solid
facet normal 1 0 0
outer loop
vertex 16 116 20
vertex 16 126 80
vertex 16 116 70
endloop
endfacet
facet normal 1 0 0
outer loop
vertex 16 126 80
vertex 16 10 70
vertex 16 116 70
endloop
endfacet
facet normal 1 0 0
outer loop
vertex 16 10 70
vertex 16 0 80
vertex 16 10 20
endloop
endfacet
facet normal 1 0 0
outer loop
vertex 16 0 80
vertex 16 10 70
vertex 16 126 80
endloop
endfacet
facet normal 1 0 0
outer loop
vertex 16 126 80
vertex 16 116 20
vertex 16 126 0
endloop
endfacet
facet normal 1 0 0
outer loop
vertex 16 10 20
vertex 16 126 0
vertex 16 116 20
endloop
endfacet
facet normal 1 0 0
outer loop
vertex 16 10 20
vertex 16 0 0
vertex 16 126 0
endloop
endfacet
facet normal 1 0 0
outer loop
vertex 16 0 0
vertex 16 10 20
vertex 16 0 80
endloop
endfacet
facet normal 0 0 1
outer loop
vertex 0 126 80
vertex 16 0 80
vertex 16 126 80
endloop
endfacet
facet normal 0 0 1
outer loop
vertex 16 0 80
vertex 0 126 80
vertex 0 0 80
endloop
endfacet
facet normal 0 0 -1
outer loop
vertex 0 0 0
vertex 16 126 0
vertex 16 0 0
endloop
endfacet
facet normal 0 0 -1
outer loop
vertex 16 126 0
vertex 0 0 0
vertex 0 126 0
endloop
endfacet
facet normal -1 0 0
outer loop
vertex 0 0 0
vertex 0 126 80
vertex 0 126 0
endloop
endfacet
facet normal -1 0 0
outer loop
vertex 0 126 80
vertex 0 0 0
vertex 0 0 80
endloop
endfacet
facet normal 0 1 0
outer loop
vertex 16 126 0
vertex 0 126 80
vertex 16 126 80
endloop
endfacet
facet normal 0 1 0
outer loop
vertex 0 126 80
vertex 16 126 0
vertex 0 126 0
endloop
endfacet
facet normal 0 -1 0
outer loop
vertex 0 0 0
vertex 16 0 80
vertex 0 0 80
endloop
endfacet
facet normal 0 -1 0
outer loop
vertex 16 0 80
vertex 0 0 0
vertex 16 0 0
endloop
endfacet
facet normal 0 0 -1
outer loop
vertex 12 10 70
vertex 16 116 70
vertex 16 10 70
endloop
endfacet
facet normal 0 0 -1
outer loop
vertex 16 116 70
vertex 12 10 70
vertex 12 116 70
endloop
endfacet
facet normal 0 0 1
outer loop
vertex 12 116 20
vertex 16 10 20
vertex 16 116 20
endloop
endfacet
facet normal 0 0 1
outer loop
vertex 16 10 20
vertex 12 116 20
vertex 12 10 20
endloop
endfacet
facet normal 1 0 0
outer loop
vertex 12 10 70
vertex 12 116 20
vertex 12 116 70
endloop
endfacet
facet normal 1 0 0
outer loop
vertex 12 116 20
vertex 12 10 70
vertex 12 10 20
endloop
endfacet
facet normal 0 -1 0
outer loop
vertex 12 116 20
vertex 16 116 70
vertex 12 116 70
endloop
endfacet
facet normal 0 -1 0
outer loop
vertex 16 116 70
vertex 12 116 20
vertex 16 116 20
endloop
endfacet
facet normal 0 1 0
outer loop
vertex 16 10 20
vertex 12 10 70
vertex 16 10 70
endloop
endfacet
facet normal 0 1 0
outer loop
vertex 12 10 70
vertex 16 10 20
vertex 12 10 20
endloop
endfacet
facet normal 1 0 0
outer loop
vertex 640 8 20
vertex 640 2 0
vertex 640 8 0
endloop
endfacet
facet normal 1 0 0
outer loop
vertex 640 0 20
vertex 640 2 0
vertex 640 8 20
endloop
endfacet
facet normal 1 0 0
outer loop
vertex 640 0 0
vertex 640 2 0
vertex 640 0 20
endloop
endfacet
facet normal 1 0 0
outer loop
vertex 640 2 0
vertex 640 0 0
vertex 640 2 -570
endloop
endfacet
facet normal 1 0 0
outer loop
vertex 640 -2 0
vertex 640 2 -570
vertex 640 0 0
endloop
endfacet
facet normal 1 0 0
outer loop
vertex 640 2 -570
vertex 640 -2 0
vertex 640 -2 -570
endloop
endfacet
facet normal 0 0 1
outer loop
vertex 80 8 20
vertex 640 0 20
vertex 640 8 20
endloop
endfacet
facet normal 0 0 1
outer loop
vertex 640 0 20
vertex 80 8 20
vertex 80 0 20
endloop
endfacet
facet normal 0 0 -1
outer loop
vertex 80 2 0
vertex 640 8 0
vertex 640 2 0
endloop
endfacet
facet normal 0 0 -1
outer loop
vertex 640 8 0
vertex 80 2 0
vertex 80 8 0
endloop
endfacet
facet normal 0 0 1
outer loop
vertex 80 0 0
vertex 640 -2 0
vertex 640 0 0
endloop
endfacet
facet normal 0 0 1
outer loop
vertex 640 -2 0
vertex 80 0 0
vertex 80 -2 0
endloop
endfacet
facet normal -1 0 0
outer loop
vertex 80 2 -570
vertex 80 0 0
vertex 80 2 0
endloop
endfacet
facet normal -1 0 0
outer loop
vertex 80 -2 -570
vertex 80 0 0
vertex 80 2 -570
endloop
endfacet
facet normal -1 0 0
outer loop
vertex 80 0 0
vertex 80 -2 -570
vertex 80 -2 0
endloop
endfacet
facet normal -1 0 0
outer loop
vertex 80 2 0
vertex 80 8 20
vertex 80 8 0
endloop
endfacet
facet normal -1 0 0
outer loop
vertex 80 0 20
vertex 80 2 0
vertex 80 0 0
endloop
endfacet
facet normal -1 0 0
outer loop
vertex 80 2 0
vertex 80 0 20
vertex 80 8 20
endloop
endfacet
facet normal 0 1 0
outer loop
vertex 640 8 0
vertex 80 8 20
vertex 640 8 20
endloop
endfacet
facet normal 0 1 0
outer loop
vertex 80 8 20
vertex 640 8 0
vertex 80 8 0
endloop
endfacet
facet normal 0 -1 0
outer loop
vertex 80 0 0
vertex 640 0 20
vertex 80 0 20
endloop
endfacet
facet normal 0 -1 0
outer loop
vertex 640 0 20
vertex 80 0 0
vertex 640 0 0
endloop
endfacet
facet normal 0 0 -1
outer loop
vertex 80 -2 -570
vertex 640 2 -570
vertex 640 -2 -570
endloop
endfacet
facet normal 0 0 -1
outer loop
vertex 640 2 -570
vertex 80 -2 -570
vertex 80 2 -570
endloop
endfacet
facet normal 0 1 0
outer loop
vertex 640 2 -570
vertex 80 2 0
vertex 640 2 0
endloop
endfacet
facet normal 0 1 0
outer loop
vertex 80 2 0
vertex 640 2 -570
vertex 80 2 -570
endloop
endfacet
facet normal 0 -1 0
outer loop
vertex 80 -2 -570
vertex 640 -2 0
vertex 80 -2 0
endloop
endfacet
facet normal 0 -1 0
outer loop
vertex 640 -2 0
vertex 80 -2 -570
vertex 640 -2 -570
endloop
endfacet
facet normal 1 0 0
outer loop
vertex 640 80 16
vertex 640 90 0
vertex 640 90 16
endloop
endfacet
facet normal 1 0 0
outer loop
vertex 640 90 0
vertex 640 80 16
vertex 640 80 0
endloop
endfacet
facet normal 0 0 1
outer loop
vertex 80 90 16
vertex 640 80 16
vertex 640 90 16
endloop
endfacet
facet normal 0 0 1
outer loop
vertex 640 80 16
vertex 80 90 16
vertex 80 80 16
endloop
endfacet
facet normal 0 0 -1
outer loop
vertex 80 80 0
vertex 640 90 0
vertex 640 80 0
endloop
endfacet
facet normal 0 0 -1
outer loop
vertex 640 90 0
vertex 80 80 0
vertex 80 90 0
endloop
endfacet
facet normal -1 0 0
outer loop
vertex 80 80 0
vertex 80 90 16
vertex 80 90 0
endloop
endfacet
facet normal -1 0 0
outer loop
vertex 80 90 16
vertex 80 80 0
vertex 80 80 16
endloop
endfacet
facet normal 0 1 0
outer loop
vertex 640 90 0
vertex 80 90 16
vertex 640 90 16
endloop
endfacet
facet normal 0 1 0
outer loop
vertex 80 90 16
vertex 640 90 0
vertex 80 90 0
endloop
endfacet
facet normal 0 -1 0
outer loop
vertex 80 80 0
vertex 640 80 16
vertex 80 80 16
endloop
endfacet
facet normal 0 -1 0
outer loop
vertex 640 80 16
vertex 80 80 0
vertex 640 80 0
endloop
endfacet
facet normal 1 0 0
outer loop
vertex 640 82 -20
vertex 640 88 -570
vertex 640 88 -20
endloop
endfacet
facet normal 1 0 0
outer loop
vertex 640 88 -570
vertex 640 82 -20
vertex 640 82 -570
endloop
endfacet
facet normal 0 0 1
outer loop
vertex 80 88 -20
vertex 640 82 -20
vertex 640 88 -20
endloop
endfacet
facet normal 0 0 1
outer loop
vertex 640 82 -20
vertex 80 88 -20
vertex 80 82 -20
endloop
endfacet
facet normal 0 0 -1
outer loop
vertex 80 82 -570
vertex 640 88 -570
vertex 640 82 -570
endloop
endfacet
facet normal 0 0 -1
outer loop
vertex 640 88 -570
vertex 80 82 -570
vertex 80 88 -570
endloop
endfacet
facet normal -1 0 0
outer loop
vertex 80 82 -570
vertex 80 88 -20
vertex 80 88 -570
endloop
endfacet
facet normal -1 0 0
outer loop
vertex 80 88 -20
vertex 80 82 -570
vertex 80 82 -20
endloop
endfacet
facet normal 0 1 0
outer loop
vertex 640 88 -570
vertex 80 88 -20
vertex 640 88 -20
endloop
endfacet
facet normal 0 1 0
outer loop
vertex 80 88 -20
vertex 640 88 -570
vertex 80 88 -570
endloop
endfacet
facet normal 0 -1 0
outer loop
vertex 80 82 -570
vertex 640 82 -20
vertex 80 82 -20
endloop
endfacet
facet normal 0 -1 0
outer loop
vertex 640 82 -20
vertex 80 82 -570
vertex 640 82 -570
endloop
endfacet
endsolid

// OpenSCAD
// file: ../params.scad
// Shared millimetre parameters. Keep in lockstep with freecad/params.py.
// Module scale: 150 kg/day wet train. Walls are CPVC sheet, not metal.

$fn = 36;

WALL        = 12;     // CPVC sheet thickness
FLOOR       = 16;     // floor plate (trough sits on this)

// LEACH CSTR 1 — inside liquor box
CSTR_L      = 2000;
CSTR_W      = 1200;
CSTR_H      = 1400;   // liquid + freeboard
FREEBOARD   = 200;

// CSTR 2 weir (same vessel, +X wall)
WEIR_W      = 450;
WEIR_CREST  = CSTR_H - FREEBOARD;   // from inner floor
WEIR_SLOT_H = 80;
WEIR_LIP    = 120;    // external spout projection

// CSTR 3 floor auger — injection-molded PVC / FG
AUGER_D     = 140;    // flight OD
AUGER_SHAFT = 40;
AUGER_PITCH = 110;
AUGER_TROUGH_W = 180;
AUGER_TROUGH_H = 110;
AUGER_OFFSET_Y = 280; // trough centreline from inner -Y wall
AUGER_INCLINE  = 28;  // deg, lifts out of liquor toward +X

// mixer / nozzles (lid)
MIXER_D     = 50;
GAS_D       = 80;     // acid-gas takeoff
DROP_X      = 80;     // inner-X of shred drop slot
DROP_L      = 400;
DROP_W      = 250;
DROP_COAM   = 80;     // raised coaming around the slot

// LEACHATE PUMP / coarse strainer — −X wall, opposite the weir
PUMP_D      = 80;     // DN80
PUMP_Z      = 450;    // centreline above inner floor (submerged)
PUMP_Y      = 900;    // centreline from inner −Y (away from auger)
STRAINER_L  = 180;
STRAINER_W  = 140;
STRAINER_H  = 160;

// mezzanine feed train
MEZZ_H      = 2200;   // platform top above tank outer floor
MEZZ_L      = 1600;   // platform length in −X
MEZZ_THK    = 12;
HOPPER_L    = 700;
HOPPER_W    = 600;
HOPPER_H    = 800;
SHRED_L     = 500;
SHRED_W     = 500;
SHRED_H     = 450;
CONV_W      = 240;
CONV_H      = 120;
CONV_PLATE  = 6;      // trough plate
CONV_FLANGE = 40;
CONV_SPRING_D = 50;
CONV_SPRING_H = 80;
CONV_BOLT   = 10;     // M10 clearance
CONV_LEN    = 1800;   // default standalone length; plant instance is computed
DUST_D      = 150;    // dust-hood outlet to DUST header
AUGER_LIFT_L = 700;

// dewater belts + split (Phase A 4–6)
FDEW_L      = 1800;
FDEW_W      = 450;
FDEW_H      = 80;
FDEW_RISE   = 120;    // solids end higher so liquor runs back to weir
SDEW_L      = 1400;
SDEW_W      = 220;
SDEW_H      = 80;
SPLIT_L     = 600;
SPLIT_W     = 500;
SPLIT_H     = 400;
STUB_L      = 400;
STUB_W      = 300;
STUB_H      = 250;

// EW funnel cell
EW_L        = 600;    // along aisle (overflow direction)
EW_W        = 420;    // anode-cathode depth
EW_H        = 650;    // rectangular body
EW_FUNNEL_H = 220;
EW_VALVE_D  = 50;
EW_VALVE_L  = 60;
EW_MEM_T    = 4;      // CEM
EW_SLOT     = 10;     // membrane cassette slot
EW_PITCH    = 750;    // aisle spacing, centre to centre
AISLE_X0    = 200;
AISLE_Y     = -(EW_W + 2*WALL) - 400;
AISLE_Z     = 400;
BUND_H      = 150;
BUND_PAD    = 250;
SUMP_L      = 400;
SUMP_W      = 400;
SUMP_H      = 300;
VDF_D       = 700;
VDF_L       = 900;
PAIL_W      = 180;
HDR_D       = 80;
HDR_Z       = 1400;
PYRO_D      = 320;
PYRO_L      = 2800;

// Campus envelopes — lockstep with freecad/params.py
FARM_X=12000; FARM_Y=8000; FARM_L=12000; FARM_W=8000; FARM_H=4500;
FAB_X=12000;  FAB_Y=-6000; FAB_L=8000;   FAB_W=6000;  FAB_H=4000;
HAB_X=-8000;  HAB_Y=8000;  HAB_L=8000;   HAB_W=6000;  HAB_H=3200;
CRYO_X=-6000; CRYO_Y=-4000; CRYO_L=4000; CRYO_W=3000; CRYO_H=3000;
MFG_X=2000;   MFG_Y=9000;  MFG_L=6000;   MFG_W=4000;  MFG_H=3500;

LIFE_Z_GREY=900; LIFE_Z_UPW=1100; LIFE_Z_ETCH=1300;
LIFE_Z_O2=2800; LIFE_Z_N2=3000; LIFE_Z_CO2=3200;
LIFE_D_GREY=50; LIFE_D_UPW=40; LIFE_D_ETCH=32;
LIFE_D_GAS=25; LIFE_D_CO2=40;
// main file
// 4.3 overflow weir plate + 4.4 anode/cathode hangers.
// Anode: Ti Grade 2 + MMO. Cathode: 316L sheet or bar. Not tank walls.
include <../params.scad>;
$fn = 24;

module overflow_weir() {
    difference() {
        cube([WALL + 4, EW_W * 0.30, 80]);
        translate([WALL, 10, 20]) cube([8, EW_W * 0.30 - 20, 50]);
    }
}

module cathode_hanger() {
    // 316L bar + sheet
    cube([EW_L - 40, 8, 20]);
    translate([0, -2, -EW_H + 80])
        cube([EW_L - 40, 4, EW_H - 80]);
}

module anode_hanger() {
    // Ti bus + MMO plate
    cube([EW_L - 40, 10, 16]);
    translate([0, 2, -EW_H + 80])
        cube([EW_L - 40, 6, EW_H - 100]);
}

overflow_weir();
translate([80, 0, 0]) cathode_hanger();
translate([80, 80, 0]) anode_hanger();
